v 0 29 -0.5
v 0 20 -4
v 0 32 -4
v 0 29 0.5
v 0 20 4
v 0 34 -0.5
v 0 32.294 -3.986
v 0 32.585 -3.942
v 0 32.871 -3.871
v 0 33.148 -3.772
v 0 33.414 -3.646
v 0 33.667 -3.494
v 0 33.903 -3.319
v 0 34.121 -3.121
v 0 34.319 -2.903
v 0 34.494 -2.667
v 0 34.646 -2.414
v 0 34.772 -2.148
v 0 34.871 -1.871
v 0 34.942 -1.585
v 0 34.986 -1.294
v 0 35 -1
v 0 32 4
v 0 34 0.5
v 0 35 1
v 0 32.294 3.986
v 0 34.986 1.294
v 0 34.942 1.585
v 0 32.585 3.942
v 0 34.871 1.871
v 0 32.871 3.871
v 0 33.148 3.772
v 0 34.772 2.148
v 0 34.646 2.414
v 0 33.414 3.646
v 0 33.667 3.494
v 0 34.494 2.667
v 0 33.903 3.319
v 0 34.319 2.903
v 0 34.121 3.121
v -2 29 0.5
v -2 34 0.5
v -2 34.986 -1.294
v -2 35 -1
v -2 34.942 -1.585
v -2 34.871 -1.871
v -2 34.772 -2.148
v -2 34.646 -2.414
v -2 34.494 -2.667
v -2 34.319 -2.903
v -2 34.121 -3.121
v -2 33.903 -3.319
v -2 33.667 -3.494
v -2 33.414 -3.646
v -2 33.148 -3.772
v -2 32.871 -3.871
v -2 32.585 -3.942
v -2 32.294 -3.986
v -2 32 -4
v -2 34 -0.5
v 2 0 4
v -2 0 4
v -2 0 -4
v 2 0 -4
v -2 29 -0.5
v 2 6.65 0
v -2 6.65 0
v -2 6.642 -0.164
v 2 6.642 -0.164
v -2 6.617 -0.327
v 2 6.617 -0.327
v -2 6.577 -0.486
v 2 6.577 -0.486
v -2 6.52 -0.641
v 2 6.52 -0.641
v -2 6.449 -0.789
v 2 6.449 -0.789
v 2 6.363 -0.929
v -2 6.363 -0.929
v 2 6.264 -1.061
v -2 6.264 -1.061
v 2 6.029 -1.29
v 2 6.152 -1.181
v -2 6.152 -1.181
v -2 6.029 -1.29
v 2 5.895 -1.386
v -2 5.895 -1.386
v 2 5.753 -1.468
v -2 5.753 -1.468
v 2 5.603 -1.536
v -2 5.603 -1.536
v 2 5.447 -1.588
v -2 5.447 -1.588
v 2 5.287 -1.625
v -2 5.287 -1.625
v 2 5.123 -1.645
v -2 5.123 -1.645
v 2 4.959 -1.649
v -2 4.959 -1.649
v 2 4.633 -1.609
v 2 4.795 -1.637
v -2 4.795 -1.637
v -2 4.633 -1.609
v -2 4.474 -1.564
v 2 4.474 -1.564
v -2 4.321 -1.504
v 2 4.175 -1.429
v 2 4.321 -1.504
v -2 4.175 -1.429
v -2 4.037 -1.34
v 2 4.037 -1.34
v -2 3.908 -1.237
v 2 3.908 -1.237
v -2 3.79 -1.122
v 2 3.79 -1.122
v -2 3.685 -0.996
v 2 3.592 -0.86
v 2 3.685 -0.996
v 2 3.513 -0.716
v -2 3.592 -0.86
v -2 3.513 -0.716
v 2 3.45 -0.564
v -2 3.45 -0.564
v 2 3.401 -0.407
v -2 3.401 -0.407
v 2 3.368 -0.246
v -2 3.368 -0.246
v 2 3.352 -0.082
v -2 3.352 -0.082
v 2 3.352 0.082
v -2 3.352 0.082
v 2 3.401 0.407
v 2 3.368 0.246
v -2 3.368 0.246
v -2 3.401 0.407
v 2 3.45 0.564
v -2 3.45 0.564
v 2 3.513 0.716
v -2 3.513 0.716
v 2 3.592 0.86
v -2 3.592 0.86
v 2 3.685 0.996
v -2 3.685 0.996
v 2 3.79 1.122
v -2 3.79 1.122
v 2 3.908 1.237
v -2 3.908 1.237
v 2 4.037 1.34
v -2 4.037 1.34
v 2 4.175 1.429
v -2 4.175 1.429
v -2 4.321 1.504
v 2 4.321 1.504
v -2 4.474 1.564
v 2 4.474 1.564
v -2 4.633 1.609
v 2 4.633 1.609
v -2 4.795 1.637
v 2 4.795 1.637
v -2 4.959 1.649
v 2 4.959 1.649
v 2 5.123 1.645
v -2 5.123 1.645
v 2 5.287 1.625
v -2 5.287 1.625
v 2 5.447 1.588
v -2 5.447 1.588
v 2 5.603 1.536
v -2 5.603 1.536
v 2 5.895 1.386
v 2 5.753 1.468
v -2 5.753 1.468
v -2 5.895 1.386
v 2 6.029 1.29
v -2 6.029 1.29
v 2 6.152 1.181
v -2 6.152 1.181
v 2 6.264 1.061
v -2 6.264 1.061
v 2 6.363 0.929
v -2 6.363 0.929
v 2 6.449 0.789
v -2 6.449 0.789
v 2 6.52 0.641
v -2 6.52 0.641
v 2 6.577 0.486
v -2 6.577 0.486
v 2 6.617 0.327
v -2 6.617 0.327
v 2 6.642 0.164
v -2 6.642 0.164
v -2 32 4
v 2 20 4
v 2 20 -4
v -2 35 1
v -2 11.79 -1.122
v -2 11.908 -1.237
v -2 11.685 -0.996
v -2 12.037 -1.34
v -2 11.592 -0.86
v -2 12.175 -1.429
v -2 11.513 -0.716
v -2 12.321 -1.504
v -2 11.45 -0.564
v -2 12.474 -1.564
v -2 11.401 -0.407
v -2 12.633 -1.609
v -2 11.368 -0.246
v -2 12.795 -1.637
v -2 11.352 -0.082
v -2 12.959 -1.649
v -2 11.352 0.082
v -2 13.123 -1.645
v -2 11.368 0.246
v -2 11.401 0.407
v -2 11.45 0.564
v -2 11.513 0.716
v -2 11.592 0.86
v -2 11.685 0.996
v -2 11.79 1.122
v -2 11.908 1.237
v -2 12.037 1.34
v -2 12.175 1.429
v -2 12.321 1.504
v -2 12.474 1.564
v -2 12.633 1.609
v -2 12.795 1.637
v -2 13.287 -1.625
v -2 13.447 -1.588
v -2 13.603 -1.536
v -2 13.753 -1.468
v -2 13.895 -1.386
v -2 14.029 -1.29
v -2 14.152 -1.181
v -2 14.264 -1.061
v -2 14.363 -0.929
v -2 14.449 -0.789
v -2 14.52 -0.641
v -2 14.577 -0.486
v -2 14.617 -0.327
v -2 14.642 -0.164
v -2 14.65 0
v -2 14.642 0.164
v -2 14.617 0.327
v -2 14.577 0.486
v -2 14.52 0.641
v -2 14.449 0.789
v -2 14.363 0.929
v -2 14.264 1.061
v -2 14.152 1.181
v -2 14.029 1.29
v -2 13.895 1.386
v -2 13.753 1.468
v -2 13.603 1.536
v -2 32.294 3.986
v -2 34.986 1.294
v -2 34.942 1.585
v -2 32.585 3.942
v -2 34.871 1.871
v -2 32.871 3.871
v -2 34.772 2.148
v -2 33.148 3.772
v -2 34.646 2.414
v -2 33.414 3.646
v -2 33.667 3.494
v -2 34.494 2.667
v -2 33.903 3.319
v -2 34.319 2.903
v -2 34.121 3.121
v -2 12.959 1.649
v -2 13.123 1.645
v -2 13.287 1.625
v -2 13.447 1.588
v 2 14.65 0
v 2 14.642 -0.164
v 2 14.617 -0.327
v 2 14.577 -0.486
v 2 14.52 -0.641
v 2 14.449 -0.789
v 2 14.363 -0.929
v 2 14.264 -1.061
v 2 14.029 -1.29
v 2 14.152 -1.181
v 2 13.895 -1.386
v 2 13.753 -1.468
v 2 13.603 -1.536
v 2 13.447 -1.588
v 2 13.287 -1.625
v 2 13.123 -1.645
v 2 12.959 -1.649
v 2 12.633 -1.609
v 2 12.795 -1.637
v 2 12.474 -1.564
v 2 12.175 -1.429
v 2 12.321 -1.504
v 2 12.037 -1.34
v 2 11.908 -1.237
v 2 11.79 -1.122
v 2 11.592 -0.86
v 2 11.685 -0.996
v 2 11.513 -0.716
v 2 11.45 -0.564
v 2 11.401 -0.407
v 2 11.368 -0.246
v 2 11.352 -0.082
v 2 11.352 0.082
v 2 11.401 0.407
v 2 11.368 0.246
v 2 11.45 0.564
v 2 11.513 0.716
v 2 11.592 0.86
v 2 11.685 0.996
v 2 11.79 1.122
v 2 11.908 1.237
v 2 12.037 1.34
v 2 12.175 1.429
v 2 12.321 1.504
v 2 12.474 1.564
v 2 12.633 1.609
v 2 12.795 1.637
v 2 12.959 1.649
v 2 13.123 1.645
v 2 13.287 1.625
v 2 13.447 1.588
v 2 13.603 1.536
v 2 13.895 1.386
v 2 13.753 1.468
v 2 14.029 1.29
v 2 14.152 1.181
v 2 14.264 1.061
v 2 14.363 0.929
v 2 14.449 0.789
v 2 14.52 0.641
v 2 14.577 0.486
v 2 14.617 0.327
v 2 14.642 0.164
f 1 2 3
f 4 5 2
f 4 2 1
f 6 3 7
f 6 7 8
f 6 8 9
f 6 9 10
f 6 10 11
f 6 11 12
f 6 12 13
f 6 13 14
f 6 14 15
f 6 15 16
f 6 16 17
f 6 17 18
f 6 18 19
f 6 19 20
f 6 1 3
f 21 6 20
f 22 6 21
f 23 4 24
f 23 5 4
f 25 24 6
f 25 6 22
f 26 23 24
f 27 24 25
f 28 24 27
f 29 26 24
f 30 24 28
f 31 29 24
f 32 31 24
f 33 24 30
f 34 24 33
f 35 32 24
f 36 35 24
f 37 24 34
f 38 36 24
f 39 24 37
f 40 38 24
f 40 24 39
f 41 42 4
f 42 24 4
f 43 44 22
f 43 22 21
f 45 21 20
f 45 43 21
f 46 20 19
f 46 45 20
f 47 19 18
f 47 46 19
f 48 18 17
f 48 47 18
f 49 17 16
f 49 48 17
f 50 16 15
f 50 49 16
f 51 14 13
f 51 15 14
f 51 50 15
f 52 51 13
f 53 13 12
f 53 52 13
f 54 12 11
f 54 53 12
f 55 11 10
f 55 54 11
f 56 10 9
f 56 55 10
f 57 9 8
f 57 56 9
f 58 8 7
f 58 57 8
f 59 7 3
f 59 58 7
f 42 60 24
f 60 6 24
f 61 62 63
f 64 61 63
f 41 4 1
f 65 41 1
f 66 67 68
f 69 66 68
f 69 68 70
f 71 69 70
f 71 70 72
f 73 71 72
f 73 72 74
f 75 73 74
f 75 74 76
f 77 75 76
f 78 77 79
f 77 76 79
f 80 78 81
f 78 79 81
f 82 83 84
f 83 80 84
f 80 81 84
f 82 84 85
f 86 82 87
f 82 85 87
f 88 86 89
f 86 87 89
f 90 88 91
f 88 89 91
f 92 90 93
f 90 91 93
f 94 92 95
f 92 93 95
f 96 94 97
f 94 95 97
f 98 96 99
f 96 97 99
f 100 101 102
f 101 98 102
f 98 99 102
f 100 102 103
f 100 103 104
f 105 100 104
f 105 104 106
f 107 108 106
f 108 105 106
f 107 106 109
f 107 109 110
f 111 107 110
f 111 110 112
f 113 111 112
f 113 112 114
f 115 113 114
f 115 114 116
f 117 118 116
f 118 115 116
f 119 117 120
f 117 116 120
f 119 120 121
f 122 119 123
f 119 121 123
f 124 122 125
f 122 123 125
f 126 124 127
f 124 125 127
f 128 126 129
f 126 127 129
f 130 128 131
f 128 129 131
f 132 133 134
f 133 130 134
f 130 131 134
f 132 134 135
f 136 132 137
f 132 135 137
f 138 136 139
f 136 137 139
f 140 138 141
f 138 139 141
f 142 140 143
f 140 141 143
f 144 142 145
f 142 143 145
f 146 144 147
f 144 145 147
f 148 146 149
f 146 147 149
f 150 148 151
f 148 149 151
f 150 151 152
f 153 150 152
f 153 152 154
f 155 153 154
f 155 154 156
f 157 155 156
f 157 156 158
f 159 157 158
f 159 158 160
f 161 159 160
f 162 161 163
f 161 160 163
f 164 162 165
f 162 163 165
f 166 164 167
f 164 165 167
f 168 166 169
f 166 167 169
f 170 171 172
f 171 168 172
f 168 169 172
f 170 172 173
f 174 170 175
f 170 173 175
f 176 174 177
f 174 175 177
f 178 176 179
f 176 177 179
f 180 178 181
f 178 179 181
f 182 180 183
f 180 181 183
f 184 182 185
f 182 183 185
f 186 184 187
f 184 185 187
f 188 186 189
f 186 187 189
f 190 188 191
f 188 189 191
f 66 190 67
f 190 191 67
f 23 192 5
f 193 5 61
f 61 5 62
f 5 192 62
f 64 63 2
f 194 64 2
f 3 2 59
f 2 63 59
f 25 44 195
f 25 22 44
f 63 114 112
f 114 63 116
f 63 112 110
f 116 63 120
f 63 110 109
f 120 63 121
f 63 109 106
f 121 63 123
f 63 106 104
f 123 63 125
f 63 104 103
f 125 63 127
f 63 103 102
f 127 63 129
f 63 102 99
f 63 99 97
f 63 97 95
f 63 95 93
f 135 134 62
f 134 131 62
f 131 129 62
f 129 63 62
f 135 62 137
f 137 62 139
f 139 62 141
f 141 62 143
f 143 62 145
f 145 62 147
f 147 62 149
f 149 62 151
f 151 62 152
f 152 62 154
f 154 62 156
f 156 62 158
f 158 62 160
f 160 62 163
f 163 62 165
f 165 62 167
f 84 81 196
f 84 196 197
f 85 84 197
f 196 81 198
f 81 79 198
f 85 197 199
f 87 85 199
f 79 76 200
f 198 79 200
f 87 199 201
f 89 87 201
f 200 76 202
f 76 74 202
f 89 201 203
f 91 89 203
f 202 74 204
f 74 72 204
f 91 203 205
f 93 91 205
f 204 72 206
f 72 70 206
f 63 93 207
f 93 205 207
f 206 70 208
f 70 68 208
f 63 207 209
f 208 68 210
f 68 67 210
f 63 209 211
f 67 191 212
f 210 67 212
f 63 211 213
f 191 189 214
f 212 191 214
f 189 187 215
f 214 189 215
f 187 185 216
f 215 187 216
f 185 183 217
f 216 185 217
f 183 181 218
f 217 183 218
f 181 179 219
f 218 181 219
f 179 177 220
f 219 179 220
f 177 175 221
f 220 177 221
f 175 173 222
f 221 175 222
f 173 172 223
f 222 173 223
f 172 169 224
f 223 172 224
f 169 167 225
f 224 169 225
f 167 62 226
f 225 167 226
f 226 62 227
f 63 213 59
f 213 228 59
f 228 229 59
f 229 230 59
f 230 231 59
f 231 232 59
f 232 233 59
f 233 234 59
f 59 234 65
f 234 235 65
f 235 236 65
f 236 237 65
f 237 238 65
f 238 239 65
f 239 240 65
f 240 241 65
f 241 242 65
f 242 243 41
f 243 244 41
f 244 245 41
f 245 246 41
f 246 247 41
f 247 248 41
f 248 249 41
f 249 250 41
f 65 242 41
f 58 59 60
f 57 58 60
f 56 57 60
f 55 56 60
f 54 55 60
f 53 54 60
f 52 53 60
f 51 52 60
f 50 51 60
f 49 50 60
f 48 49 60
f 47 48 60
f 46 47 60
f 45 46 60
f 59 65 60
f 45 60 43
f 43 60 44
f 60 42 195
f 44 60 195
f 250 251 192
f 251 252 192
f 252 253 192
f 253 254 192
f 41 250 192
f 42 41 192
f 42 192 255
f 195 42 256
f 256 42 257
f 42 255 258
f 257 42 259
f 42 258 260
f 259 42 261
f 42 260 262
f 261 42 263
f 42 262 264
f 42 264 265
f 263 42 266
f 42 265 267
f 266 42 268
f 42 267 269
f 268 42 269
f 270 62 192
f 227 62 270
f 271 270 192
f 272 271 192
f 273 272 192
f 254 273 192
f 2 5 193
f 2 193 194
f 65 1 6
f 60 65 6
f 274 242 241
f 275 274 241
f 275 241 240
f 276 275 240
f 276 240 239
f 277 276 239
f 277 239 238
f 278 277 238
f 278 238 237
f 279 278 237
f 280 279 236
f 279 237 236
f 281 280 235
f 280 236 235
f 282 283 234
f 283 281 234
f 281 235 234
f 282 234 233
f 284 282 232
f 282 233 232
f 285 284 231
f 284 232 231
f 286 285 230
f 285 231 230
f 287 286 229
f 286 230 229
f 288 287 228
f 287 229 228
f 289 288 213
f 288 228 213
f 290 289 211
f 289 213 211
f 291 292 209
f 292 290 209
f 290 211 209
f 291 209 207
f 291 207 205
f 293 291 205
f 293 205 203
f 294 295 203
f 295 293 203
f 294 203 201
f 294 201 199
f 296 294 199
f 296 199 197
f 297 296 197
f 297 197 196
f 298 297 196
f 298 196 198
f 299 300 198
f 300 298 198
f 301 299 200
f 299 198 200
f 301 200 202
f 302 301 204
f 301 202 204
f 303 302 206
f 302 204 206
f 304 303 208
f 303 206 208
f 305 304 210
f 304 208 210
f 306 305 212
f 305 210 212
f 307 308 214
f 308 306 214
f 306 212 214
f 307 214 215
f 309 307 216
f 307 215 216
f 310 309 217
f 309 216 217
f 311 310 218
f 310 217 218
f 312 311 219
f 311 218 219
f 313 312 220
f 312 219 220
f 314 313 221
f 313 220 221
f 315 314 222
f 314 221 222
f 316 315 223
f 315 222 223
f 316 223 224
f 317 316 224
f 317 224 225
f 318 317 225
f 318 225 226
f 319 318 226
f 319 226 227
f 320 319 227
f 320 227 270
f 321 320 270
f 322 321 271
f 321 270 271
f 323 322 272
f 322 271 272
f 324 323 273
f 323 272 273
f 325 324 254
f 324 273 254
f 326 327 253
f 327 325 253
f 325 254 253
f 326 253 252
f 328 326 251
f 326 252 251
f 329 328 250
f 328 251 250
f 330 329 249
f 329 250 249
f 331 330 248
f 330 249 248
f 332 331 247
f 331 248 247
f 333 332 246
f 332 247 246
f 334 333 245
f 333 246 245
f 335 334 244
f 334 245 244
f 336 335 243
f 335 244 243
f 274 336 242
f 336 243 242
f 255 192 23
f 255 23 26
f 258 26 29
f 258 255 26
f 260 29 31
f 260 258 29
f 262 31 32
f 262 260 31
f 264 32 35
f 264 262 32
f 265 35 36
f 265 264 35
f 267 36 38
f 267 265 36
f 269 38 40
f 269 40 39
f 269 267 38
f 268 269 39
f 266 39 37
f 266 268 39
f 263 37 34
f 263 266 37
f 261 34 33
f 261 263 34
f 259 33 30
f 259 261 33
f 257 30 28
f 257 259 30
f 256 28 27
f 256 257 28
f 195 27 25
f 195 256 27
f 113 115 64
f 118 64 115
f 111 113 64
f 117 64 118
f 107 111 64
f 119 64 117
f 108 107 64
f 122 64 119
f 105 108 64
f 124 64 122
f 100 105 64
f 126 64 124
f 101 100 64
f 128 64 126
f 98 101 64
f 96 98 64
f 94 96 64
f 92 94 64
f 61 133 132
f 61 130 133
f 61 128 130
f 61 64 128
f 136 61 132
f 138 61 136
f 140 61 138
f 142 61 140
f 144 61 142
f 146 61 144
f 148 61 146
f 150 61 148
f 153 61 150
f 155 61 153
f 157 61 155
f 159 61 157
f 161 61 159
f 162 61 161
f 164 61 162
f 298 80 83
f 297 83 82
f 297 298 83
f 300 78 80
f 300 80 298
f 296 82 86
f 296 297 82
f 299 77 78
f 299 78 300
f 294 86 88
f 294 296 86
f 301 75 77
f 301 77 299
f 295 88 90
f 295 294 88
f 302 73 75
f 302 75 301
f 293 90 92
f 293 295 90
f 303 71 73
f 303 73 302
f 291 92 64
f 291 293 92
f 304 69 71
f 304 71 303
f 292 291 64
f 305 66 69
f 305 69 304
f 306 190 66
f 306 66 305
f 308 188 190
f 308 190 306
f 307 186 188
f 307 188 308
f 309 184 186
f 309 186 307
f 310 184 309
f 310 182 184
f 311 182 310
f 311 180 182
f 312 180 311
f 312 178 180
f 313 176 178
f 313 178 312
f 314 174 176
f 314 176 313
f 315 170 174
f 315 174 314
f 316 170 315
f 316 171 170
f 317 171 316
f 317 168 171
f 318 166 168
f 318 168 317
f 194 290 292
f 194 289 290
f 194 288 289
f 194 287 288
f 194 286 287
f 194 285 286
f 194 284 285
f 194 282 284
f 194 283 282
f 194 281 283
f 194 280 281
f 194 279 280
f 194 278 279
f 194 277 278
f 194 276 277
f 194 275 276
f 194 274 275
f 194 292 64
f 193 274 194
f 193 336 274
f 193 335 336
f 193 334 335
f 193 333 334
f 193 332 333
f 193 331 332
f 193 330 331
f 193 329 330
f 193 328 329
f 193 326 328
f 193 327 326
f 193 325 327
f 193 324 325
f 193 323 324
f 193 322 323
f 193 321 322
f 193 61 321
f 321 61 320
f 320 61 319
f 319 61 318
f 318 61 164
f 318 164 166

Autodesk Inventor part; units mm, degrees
ref_plane "YZ Plane" through (0, 0, 0) normal (1, 0, 0) x (0, 1, 0)
ref_plane "XZ Plane" through (0, 0, 0) normal (0, 1, 0) x (-1, 0, 0)
ref_plane "XY Plane" through (0, 0, 0) normal (0, 0, 1) x (1, 0, 0)
sketch "Sketch1" plane through (0, 0, 0) normal (1, 0, 0) x (0, 1, 0)
  line L0 (35, 4) -> (0, 4)
  line L1 (0, 4) -> (0, -4)
  line L2 (0, -4) -> (35, -4)
  line L3 (35, -4) -> (35, 4)
  line L4 (34, 0.5) -> (29, 0.5)
  line L5 (29, 0.5) -> (29, -0.5)
  line L6 (29, -0.5) -> (34, -0.5)
  line L7 (34, -0.5) -> (34, 0.5)
  line L8 (20, 4) -> (20, -4)
  circle A0 centre (13, 0) radius 1.65
  circle A1 centre (5, 0) radius 1.65
  point P0 (0, 0)
  point P1 (0, 0)
  point P2 (29, 0)
  point P3 (20, 0)
  dimension "d0" = 8
  dimension "d2" = 1
  dimension "d3" = 1
  dimension "d4" = 5
  dimension "d5" = 20
  dimension "d6" = 15
  dimension "d7" = 3.3
  dimension "d8" = 3.3
  dimension "d9" = 7
  dimension "d10" = 8
extrude "Extrusion1" add sketch "Sketch1" along normal blind 2 contours L8 L2 L1 L0
extrude "Extrusion2" add sketch "Sketch1" against normal blind 2
fillet "Fillet1" radius 3 2 edges at (-1, 35, 4) (-1, 35, -4)
properties part number "MUESCA_DETECCION_CERO" material "Steel, Mild, Welded"
